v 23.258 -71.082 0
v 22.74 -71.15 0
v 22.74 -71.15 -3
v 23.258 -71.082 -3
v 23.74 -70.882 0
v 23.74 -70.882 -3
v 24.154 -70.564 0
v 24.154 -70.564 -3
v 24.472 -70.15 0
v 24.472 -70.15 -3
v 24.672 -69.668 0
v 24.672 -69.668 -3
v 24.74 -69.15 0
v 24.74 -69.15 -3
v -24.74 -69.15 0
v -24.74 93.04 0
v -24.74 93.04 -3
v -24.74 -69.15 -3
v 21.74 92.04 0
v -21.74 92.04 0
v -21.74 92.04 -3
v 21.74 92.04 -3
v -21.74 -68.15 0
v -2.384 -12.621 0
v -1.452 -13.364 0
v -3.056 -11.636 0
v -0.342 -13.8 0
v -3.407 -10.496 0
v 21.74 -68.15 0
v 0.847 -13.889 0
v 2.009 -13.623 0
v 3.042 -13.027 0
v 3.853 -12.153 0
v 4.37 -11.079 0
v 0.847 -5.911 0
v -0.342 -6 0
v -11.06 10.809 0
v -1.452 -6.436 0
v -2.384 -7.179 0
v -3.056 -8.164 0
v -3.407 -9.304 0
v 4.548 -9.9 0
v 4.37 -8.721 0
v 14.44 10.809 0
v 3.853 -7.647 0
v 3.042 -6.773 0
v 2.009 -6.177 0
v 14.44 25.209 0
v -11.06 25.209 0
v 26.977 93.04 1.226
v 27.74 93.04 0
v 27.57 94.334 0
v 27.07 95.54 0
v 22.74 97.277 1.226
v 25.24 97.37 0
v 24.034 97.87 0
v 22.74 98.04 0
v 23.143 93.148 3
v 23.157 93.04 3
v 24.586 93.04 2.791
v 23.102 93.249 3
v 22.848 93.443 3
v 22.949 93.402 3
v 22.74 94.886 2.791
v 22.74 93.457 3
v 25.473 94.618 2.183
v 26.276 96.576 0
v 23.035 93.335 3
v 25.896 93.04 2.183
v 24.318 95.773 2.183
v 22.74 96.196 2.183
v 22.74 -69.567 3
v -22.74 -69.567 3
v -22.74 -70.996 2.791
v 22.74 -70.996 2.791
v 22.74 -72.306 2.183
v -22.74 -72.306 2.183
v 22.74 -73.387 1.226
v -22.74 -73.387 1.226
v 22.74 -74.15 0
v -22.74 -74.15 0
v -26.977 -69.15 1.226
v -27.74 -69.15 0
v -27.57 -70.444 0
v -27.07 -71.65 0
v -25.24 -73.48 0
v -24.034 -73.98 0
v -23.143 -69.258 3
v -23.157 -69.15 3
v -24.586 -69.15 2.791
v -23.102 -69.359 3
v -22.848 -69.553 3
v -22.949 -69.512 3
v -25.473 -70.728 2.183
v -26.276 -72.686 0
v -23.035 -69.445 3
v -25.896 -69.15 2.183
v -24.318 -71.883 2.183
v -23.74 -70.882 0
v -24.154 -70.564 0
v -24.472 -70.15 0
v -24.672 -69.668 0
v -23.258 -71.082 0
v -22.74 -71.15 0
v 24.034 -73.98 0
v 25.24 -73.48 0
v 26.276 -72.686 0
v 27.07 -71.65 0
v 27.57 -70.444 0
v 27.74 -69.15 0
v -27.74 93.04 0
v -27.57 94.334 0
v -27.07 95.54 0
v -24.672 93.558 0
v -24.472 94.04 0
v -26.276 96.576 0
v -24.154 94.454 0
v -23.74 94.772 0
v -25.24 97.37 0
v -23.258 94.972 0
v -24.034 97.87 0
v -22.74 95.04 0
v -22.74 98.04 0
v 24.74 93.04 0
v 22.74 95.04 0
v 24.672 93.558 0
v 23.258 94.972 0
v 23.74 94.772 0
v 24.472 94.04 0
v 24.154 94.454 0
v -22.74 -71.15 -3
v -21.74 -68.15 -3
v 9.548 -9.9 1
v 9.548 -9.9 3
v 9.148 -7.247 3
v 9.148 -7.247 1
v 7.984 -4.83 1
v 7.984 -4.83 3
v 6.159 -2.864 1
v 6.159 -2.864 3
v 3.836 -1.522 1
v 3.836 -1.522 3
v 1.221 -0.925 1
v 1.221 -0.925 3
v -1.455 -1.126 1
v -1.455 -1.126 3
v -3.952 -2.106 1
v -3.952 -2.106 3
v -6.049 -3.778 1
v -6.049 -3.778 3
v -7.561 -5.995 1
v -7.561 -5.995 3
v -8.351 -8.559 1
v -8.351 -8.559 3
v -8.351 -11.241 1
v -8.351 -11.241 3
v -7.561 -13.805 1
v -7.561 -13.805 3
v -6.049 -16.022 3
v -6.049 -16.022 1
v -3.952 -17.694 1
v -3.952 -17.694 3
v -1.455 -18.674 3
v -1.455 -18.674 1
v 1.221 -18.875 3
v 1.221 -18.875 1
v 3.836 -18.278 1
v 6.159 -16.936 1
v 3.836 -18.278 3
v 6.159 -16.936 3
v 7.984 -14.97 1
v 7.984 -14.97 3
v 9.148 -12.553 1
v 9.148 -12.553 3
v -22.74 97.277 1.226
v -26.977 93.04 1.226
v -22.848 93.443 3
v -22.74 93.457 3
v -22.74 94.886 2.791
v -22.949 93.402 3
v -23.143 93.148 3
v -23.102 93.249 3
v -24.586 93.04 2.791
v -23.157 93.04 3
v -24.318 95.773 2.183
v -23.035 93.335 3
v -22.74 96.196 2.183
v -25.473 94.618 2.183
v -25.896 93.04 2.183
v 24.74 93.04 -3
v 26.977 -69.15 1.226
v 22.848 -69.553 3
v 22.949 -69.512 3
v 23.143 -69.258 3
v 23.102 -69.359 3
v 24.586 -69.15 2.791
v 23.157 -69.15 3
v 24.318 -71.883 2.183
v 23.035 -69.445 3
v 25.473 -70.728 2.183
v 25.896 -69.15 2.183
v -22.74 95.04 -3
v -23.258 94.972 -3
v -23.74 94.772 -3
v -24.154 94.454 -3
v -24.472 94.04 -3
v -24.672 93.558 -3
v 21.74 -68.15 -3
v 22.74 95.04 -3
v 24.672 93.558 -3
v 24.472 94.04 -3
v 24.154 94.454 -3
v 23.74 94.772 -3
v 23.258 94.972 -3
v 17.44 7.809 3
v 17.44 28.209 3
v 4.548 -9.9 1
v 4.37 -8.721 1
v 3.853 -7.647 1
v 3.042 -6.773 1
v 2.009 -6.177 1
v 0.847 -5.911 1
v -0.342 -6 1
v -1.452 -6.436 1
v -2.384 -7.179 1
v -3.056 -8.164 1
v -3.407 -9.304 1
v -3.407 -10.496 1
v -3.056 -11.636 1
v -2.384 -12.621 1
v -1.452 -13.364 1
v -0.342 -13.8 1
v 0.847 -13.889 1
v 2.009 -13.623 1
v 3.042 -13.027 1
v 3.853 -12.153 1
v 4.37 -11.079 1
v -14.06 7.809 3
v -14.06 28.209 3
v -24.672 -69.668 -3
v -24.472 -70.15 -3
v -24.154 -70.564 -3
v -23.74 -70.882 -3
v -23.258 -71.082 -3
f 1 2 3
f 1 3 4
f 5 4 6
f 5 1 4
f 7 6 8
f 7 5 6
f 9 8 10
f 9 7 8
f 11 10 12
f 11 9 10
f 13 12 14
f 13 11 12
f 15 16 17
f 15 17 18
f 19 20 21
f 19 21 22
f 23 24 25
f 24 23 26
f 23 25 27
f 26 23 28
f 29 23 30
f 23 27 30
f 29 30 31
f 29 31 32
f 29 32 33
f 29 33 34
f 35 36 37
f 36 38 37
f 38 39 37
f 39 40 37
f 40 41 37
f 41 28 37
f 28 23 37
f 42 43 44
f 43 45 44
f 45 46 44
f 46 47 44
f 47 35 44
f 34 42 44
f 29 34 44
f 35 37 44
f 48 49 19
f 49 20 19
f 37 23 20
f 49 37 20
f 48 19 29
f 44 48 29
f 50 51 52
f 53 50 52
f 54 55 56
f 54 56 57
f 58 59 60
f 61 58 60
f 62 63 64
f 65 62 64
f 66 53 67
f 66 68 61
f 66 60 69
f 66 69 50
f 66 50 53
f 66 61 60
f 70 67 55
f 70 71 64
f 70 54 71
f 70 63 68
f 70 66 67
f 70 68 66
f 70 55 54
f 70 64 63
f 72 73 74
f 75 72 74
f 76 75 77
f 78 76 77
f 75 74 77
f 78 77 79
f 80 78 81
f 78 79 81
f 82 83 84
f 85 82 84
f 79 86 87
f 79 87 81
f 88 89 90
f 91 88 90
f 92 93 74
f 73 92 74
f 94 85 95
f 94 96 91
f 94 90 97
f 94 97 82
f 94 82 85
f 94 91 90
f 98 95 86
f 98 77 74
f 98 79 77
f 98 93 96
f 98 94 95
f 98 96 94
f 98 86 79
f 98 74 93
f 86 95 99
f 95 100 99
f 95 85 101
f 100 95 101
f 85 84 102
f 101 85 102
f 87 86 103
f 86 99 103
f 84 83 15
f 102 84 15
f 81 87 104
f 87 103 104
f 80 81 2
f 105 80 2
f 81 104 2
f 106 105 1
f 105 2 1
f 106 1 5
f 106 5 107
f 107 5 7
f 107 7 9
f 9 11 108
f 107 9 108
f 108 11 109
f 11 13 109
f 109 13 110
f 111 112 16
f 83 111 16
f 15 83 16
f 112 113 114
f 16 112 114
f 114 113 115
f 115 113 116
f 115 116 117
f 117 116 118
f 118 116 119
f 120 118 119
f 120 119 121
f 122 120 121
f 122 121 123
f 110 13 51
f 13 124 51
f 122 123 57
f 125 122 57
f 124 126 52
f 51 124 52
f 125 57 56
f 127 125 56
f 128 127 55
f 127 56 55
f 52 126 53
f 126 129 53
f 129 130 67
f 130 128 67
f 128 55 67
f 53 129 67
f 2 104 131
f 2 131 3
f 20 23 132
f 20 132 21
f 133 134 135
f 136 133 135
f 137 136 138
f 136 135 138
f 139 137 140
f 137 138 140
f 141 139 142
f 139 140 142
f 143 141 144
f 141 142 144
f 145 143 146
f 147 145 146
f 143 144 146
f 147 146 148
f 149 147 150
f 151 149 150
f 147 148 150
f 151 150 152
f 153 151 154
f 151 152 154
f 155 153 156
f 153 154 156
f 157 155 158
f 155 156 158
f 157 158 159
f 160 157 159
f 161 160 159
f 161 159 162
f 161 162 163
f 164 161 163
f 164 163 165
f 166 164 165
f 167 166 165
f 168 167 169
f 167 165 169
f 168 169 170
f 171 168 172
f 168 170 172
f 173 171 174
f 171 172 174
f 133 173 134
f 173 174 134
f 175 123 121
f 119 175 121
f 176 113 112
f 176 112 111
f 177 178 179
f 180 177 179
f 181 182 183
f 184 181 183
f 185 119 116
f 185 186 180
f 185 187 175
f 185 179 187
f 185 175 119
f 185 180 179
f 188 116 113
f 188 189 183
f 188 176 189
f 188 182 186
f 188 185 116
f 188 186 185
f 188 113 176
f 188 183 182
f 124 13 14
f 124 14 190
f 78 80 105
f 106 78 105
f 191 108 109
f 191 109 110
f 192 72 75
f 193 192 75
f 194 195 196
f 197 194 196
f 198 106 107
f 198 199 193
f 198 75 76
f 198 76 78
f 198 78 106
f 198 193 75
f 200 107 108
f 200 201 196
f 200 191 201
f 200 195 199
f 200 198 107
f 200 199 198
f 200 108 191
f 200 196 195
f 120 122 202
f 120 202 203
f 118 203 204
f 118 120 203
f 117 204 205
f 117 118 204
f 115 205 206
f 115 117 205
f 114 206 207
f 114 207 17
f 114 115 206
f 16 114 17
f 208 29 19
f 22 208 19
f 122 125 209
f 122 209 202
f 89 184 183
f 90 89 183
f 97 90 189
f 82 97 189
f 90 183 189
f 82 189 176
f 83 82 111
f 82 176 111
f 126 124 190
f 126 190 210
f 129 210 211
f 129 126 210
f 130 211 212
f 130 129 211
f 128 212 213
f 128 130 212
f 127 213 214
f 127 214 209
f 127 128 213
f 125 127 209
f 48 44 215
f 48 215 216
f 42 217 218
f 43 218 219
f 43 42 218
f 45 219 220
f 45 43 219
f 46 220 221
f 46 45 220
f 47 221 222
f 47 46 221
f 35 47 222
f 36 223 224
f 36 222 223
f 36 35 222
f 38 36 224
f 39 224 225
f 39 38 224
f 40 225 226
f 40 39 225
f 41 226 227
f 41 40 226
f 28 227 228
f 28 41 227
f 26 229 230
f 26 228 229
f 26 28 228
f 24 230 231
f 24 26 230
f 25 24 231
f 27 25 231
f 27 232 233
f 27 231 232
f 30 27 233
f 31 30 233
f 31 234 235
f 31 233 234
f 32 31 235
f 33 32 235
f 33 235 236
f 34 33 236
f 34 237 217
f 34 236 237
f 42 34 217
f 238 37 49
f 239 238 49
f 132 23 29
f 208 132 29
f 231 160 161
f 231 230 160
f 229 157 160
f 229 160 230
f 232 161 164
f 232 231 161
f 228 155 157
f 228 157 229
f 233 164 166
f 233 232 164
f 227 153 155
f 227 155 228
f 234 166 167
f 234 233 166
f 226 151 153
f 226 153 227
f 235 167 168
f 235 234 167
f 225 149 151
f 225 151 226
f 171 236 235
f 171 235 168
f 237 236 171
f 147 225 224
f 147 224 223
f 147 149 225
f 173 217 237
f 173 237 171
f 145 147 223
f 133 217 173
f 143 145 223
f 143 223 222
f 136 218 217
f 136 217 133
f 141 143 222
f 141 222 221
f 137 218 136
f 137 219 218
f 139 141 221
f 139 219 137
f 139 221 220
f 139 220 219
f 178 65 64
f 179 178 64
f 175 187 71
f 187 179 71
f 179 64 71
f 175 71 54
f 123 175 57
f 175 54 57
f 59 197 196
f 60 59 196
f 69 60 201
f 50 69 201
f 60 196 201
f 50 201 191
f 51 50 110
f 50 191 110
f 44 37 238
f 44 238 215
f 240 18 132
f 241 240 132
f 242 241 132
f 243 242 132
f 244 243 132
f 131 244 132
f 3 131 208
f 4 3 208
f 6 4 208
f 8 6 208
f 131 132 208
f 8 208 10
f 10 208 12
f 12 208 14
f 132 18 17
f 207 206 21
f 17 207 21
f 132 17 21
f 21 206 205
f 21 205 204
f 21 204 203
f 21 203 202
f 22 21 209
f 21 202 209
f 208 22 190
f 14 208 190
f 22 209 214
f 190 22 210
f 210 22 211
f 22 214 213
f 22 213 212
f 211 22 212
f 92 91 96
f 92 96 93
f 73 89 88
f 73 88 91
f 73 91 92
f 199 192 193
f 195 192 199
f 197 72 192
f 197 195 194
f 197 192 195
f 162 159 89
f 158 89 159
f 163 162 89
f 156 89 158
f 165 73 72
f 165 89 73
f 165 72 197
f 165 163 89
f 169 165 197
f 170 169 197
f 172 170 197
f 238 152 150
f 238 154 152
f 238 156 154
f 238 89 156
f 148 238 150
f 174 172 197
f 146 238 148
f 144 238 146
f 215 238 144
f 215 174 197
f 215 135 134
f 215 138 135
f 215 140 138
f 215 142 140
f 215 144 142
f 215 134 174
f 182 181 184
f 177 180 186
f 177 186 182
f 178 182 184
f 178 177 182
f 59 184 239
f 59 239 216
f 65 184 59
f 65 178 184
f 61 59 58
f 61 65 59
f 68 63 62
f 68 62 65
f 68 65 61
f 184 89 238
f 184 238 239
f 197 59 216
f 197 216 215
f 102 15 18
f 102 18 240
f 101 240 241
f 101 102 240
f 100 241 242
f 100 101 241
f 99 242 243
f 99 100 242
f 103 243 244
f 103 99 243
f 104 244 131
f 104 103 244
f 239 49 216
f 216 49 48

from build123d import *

# Parameters (mm, degrees)
ESQUISSE1_W             = 43.48
ESQUISSE1_H             = 160.19
BOSS_EXTRU_1_DEPTH      = 3
ESQUISSE2_R             = 4
BOSS_EXTRU_2_DEPTH      = 3
ENL_V_MAT_EXTRU_1_REACH = 104.065
ESQUISSE3_W             = 25.5
ESQUISSE3_H             = 14.4
CHANFREIN1_SIZE         = 3
CONG_1_R                = 5
ESQUISSE4_R             = 9
ENL_V_MAT_EXTRU_2_DEPTH = 2


# Some blends are built 0.0001 mm under size
with BuildPart() as part:
    # Esquisse1 → Boss.-Extru.1 (new body)
    with BuildSketch(Plane.XY):
        with BuildLine():
            Line((24.74, -69.15), (24.74, 93.04))
            ThreePointArc((24.74, 93.04), (24.154213562, 94.454213562), (22.74, 95.04))
            Line((22.74, 95.04), (-22.74, 95.04))
            ThreePointArc((-22.74, 95.04), (-24.154213562, 94.454213562), (-24.74, 93.04))
            Line((-24.74, 93.04), (-24.74, -69.15))
            ThreePointArc((-24.74, -69.15), (-24.154213562, -70.564213562), (-22.74, -71.15))
            Line((-22.74, -71.15), (22.74, -71.15))
            ThreePointArc((22.74, -71.15), (24.154213562, -70.564213562), (24.74, -69.15))
        make_face()
        with Locations((0, 11.945)):
            Rectangle(ESQUISSE1_W, ESQUISSE1_H, mode=Mode.SUBTRACT)
    extrude(amount=-BOSS_EXTRU_1_DEPTH)

    # Esquisse2 → Boss.-Extru.2 (add)
    with BuildSketch(Plane.XY):
        with BuildLine():
            Line((-22.74, -74.15), (22.74, -74.15))
            ThreePointArc((22.74, -74.15), (26.275533906, -72.685533906), (27.74, -69.15))
            Line((27.74, -69.15), (27.74, 93.04))
            ThreePointArc((27.74, 93.04), (26.275533906, 96.575533906), (22.74, 98.04))
            Line((22.74, 98.04), (-22.74, 98.04))
            ThreePointArc((-22.74, 98.04), (-26.275533906, 96.575533906), (-27.74, 93.04))
            Line((-27.74, 93.04), (-27.74, -69.15))
            ThreePointArc((-27.74, -69.15), (-26.275533906, -72.685533906), (-22.74, -74.15))
        make_face()
        with Locations((0.548, -9.9)):
            Circle(ESQUISSE2_R, mode=Mode.SUBTRACT)
    extrude(amount=BOSS_EXTRU_2_DEPTH)

    # Esquisse3 → Enlèv. mat.-Extru.1 (cut, up to next)
    with BuildSketch(Plane.XY.offset(3), mode=Mode.PRIVATE) as enl_v_mat_extru_1_sk1:
        with Locations((1.690390628, 18.008987034)):
            Rectangle(ESQUISSE3_W, ESQUISSE3_H)
    enl_v_mat_extru_1_tool1 = extrude(enl_v_mat_extru_1_sk1.sketch, amount=-ENL_V_MAT_EXTRU_1_REACH, mode=Mode.PRIVATE) & part.part
    add(enl_v_mat_extru_1_tool1.solids().sort_by_distance((1.690391, 18.008987, 3))[0], mode=Mode.SUBTRACT)

    # Chanfrein1
    chanfrein1_edges = [part.edges().sort_by_distance(p)[0] for p in [
        (14.440390628, 18.008987034, 3),
        (1.690390628, 10.808987034, 3),
        (-11.059609372, 18.008987034, 3),
        (1.690390628, 25.208987034, 3),
    ]]
    chamfer(chanfrein1_edges, length=CHANFREIN1_SIZE - 0.0001)  # a hair under: the kernel refuses the full size

    # Congé1
    # the kernel refuses this fillet: 5 mm, written as the material it takes off along each edge
    with BuildSketch(Plane(origin=(-27.74, 93.04, 3), x_dir=(1, 0, 0), z_dir=(0, -1, 0)), Plane(origin=(27.74, -69.15, 3), x_dir=(-1, 0, 0), z_dir=(0, 1, 0))) as cong_1_piece_1:
        with BuildLine():
            CenterArc((4.582575695, -5), CONG_1_R, 90, 66.421821522)
            Line((0, -3), (-0.091651514, -2.96))
            ThreePointArc((-0.091651514, -2.96), (-0.1, -1.5), (-0.1, 0))
            Line((-0.1, 0), (0, 0.1))
            Line((0, 0.1), (4.582575695, 0.1))
            Line((4.582575695, 0.1), (4.582575695, 0))
        make_face()
    extrude(amount=162.19, mode=Mode.SUBTRACT)
    with BuildSketch(Plane(origin=(-22.74, 93.04, 3), x_dir=(0, 1, 0), z_dir=(1, 0, 0))) as cong_1_piece_2:
        with BuildLine():
            CenterArc((0.417424305, -5), CONG_1_R, 23.578178478, 66.421821522)
            Line((5, -3), (5.091651514, -2.96))
            ThreePointArc((5.091651514, -2.96), (5.1, -1.5), (5.1, 0))
            Line((5.1, 0), (5, 0.1))
            Line((5, 0.1), (0.417424305, 0.1))
            Line((0.417424305, 0.1), (0.417424305, 0))
        make_face()
    revolve(axis=Axis((-22.74, 93.04, 3), (0, 0, 1)), revolution_arc=90, mode=Mode.SUBTRACT)
    with BuildSketch(Plane(origin=(22.74, 98.04, 3), x_dir=(0, -1, 0), z_dir=(-1, 0, 0)), Plane(origin=(-22.74, -74.15, 3), x_dir=(0, 1, 0), z_dir=(1, 0, 0))) as cong_1_piece_3:
        with BuildLine():
            CenterArc((4.582575695, -5), CONG_1_R, 90, 66.421821522)
            Line((0, -3), (-0.091651514, -2.96))
            ThreePointArc((-0.091651514, -2.96), (-0.1, -1.5), (-0.1, 0))
            Line((-0.1, 0), (0, 0.1))
            Line((0, 0.1), (4.582575695, 0.1))
            Line((4.582575695, 0.1), (4.582575695, 0))
        make_face()
    extrude(amount=45.48, mode=Mode.SUBTRACT)
    with BuildSketch(Plane(origin=(22.74, 93.04, 3), x_dir=(1, 0, 0), z_dir=(0, -1, 0))) as cong_1_piece_4:
        with BuildLine():
            CenterArc((0.417424305, -5), CONG_1_R, 23.578178478, 66.421821522)
            Line((5, -3), (5.091651514, -2.96))
            ThreePointArc((5.091651514, -2.96), (5.1, -1.5), (5.1, 0))
            Line((5.1, 0), (5, 0.1))
            Line((5, 0.1), (0.417424305, 0.1))
            Line((0.417424305, 0.1), (0.417424305, 0))
        make_face()
    revolve(axis=Axis((22.74, 93.04, 3), (0, 0, 1)), revolution_arc=90, mode=Mode.SUBTRACT)
    with BuildSketch(Plane(origin=(22.74, -69.15, 3), x_dir=(0, -1, 0), z_dir=(-1, 0, 0))) as cong_1_piece_5:
        with BuildLine():
            CenterArc((0.417424305, -5), CONG_1_R, 23.578178478, 66.421821522)
            Line((5, -3), (5.091651514, -2.96))
            ThreePointArc((5.091651514, -2.96), (5.1, -1.5), (5.1, 0))
            Line((5.1, 0), (5, 0.1))
            Line((5, 0.1), (0.417424305, 0.1))
            Line((0.417424305, 0.1), (0.417424305, 0))
        make_face()
    revolve(axis=Axis((22.74, -69.15, 3), (0, 0, 1)), revolution_arc=90, mode=Mode.SUBTRACT)
    with BuildSketch(Plane(origin=(-22.74, -69.15, 3), x_dir=(-1, 0, 0), z_dir=(0, 1, 0))) as cong_1_piece_6:
        with BuildLine():
            CenterArc((0.417424305, -5), CONG_1_R, 23.578178478, 66.421821522)
            Line((5, -3), (5.091651514, -2.96))
            ThreePointArc((5.091651514, -2.96), (5.1, -1.5), (5.1, 0))
            Line((5.1, 0), (5, 0.1))
            Line((5, 0.1), (0.417424305, 0.1))
            Line((0.417424305, 0.1), (0.417424305, 0))
        make_face()
    revolve(axis=Axis((-22.74, -69.15, 3), (0, 0, 1)), revolution_arc=90, mode=Mode.SUBTRACT)

    # Esquisse4 → Enlèv. mat.-Extru.2 (cut)
    with BuildSketch(Plane.XY.offset(3)):
        with Locations((0.548, -9.9)):
            Circle(ESQUISSE4_R)
    extrude(amount=-ENL_V_MAT_EXTRU_2_DEPTH, mode=Mode.SUBTRACT)


solid = part.part
